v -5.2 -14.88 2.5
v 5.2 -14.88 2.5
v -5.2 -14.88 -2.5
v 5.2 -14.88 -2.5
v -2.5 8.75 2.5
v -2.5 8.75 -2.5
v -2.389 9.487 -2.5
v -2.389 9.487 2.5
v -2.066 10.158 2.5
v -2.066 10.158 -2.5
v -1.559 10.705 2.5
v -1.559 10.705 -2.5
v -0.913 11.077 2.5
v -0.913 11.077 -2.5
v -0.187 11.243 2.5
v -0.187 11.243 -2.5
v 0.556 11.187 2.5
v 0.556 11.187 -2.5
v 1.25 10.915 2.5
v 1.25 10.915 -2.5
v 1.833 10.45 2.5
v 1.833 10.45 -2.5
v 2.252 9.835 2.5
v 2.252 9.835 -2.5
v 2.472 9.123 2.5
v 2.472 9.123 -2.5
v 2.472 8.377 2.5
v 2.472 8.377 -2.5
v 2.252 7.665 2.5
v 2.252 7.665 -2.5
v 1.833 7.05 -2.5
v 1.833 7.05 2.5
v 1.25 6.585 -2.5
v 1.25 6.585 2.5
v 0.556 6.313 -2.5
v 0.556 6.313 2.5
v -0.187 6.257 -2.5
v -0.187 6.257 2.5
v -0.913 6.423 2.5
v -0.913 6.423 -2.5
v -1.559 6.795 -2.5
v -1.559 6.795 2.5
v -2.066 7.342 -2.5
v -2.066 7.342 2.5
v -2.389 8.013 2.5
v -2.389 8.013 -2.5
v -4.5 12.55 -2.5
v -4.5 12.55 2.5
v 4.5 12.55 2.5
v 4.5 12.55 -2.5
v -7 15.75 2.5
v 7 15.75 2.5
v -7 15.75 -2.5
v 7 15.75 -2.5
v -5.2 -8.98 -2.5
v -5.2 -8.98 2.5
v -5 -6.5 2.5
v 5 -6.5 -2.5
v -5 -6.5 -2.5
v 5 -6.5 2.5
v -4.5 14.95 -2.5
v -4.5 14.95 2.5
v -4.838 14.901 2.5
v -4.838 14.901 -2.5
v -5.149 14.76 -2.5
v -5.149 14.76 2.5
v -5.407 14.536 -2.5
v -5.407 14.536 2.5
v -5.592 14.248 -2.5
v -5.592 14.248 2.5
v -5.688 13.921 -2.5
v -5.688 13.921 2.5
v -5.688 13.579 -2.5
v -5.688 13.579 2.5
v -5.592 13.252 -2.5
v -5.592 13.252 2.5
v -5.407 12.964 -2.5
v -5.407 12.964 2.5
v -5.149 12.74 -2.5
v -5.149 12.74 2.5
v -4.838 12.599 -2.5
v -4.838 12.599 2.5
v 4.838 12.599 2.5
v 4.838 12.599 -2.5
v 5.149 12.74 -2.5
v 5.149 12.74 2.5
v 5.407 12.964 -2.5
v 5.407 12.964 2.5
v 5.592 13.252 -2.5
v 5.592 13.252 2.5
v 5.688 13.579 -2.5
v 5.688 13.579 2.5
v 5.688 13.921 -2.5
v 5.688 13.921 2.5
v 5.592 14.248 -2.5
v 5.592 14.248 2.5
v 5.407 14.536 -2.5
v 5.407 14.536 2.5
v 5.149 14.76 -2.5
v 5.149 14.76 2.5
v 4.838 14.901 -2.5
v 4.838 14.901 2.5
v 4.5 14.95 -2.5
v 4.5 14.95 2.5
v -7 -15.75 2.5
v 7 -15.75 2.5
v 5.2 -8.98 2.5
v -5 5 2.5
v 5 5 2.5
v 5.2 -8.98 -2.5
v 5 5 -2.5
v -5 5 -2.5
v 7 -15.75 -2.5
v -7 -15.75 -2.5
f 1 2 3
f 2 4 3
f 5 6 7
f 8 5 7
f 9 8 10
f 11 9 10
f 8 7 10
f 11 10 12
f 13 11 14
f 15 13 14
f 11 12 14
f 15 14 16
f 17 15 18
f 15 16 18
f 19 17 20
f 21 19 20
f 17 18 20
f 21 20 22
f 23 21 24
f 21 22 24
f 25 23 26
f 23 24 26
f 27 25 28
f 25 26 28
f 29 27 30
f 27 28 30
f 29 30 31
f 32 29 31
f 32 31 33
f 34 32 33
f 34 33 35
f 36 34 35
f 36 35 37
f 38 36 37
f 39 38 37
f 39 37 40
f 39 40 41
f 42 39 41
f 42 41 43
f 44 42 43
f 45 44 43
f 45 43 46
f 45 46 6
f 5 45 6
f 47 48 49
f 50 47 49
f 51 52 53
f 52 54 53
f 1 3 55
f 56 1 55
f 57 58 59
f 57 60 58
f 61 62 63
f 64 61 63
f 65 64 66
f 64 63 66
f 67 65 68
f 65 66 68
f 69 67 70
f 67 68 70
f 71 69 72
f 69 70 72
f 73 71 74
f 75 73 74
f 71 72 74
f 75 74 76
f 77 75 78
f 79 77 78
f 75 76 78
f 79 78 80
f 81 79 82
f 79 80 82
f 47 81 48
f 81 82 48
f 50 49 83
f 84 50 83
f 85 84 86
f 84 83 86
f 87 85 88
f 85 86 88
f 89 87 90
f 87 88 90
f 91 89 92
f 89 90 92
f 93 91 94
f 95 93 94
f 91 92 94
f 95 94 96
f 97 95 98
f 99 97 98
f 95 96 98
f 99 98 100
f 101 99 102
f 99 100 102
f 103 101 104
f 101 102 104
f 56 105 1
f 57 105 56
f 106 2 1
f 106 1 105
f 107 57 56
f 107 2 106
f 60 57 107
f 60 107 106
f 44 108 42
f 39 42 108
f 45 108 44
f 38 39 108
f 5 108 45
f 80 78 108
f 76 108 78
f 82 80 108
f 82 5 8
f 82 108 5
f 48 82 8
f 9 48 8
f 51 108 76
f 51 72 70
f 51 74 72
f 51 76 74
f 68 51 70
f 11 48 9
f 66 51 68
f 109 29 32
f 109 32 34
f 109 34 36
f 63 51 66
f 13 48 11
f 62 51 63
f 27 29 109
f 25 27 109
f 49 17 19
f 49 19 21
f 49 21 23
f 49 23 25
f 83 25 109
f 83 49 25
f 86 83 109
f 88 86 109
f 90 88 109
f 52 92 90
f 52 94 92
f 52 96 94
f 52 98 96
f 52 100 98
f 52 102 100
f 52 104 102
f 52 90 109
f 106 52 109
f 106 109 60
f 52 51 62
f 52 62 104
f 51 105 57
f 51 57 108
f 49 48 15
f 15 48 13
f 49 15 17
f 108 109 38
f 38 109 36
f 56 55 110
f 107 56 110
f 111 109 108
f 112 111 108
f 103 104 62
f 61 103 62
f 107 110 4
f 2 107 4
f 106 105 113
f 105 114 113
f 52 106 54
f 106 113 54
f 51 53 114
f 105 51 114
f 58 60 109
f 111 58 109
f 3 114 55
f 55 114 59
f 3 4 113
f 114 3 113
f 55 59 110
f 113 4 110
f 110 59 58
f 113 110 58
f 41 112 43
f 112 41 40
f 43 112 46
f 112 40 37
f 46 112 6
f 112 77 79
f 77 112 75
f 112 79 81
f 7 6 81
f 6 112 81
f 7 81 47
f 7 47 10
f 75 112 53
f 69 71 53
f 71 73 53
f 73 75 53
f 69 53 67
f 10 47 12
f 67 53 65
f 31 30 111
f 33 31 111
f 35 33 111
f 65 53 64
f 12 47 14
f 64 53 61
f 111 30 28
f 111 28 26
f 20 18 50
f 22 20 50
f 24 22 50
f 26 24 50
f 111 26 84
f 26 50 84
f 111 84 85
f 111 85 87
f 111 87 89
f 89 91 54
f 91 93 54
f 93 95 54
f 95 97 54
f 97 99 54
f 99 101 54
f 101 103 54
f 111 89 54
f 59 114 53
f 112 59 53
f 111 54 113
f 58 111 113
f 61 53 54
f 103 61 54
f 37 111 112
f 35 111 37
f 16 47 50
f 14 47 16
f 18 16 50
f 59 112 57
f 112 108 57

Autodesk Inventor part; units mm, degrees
sketch "Эскиз1" plane through (0, 0, 0) normal (0, 0, 1) x (1, 0, 0)
  line L0 (-7, -15.75) -> (7, -15.75)
  line L1 (7, -15.75) -> (7, 15.75)
  line L2 (7, 15.75) -> (-7, 15.75)
  line L3 (-7, 15.75) -> (-7, -15.75)
  line L4 (-7, -15.75) -> (7, 15.75) construction
  line L5 (7, -15.75) -> (-7, 15.75) construction
  point P0 (0, 0)
  dimension "d0" = 14
  dimension "d1" = 31.5
extrude "Выдавливание1" add sketch "Эскиз1" along normal mid plane 5
sketch "Эскиз2" plane through (0, 0, -2.5) normal (0, 0, -1) x (-1, 0, 0)
  circle A0 centre (0, 8.75) radius 1.5 projected
  circle A1 centre (0, 8.75) radius 2.5
  point P0 (0, 0)
  dimension "d7" = 1
sketch "Эскиз3" plane through (0, 0, -2.5) normal (0, 0, -1) x (-1, 0, 0)
  line L0 (-5.2, -14.88) -> (5.2, -14.88)
  line L1 (5.2, -14.88) -> (5.2, -8.98)
  line L2 (5.2, -8.98) -> (-5.2, -8.98)
  line L3 (-5.2, -8.98) -> (-5.2, -14.88)
  line L4 (-5.2, -14.88) -> (5.2, -8.98) construction
  line L5 (5.2, -14.88) -> (-5.2, -8.98) construction
  line L6 (-7, -15.75) -> (7, -15.75) projected
  line L7 (0, -22.05) -> (0, 22.05) construction
  point P0 (0, 0)
  point P1 (0, -11.93)
  dimension "d4" = 0.87
  dimension "d5" = 5.9
  dimension "d6" = 10.4
extrude "Выдавливание2" cut sketch "Эскиз2" against normal up to next contours A0 | A1
extrude "Выдавливание3" cut sketch "Эскиз3" against normal up to next
sketch "Эскиз4" plane through (0, 0, 2.5) normal (0, 0, 1) x (1, 0, 0)
  line L0 (-4.5, 13.75) -> (4.5, 13.75) construction
  line L1 (-4.5, 12.55) -> (4.5, 12.55)
  line L2 (4.5, 14.95) -> (-4.5, 14.95)
  arc A0 (-4.5, 14.95) -> (-4.5, 12.55) centre (-4.5, 13.75) ccw
  arc A1 (4.5, 12.55) -> (4.5, 14.95) centre (4.5, 13.75) ccw
  line L3 (7, 15.75) -> (-7, 15.75) projected
  line L4 (0, 22.05) -> (0, -22.05) construction
  point P0 (0, 0)
  point P1 (0, 13.75)
  dimension "d12" = 9
  dimension "d13" = 1.2
  dimension "d14" = 2
extrude "Выдавливание4" cut sketch "Эскиз4" against normal up to next
sketch "Эскиз5" plane through (0, 0, 2.5) normal (0, 0, 1) x (1, 0, 0)
  line L0 (-9.8, 0) -> (9.8, 0) construction
  line L1 (-5, 0) -> (5, 0) construction
  line L2 (5, 0) -> (5, -6.5)
  line L3 (5, -6.5) -> (-5, -6.5)
  line L4 (-5, -6.5) -> (-5, 0)
  line L5 (-5, 0) -> (5, 0) construction
  line L6 (5, 0) -> (5, 5)
  line L7 (5, 5) -> (-5, 5)
  line L8 (-5, 5) -> (-5, 0)
  line L9 (-5, 5) -> (5, -6.5) construction
  line L10 (5, 5) -> (-5, -6.5) construction
  line L11 (0, 22.05) -> (0, -22.05) construction
  point P0 (0, -0.75)
  dimension "d22" = 6.5
  dimension "d23" = 5
  dimension "d24" = 10
extrude "Выдавливание5" cut sketch "Эскиз5" against normal up to next
properties part number "Крепление_TCRT"
